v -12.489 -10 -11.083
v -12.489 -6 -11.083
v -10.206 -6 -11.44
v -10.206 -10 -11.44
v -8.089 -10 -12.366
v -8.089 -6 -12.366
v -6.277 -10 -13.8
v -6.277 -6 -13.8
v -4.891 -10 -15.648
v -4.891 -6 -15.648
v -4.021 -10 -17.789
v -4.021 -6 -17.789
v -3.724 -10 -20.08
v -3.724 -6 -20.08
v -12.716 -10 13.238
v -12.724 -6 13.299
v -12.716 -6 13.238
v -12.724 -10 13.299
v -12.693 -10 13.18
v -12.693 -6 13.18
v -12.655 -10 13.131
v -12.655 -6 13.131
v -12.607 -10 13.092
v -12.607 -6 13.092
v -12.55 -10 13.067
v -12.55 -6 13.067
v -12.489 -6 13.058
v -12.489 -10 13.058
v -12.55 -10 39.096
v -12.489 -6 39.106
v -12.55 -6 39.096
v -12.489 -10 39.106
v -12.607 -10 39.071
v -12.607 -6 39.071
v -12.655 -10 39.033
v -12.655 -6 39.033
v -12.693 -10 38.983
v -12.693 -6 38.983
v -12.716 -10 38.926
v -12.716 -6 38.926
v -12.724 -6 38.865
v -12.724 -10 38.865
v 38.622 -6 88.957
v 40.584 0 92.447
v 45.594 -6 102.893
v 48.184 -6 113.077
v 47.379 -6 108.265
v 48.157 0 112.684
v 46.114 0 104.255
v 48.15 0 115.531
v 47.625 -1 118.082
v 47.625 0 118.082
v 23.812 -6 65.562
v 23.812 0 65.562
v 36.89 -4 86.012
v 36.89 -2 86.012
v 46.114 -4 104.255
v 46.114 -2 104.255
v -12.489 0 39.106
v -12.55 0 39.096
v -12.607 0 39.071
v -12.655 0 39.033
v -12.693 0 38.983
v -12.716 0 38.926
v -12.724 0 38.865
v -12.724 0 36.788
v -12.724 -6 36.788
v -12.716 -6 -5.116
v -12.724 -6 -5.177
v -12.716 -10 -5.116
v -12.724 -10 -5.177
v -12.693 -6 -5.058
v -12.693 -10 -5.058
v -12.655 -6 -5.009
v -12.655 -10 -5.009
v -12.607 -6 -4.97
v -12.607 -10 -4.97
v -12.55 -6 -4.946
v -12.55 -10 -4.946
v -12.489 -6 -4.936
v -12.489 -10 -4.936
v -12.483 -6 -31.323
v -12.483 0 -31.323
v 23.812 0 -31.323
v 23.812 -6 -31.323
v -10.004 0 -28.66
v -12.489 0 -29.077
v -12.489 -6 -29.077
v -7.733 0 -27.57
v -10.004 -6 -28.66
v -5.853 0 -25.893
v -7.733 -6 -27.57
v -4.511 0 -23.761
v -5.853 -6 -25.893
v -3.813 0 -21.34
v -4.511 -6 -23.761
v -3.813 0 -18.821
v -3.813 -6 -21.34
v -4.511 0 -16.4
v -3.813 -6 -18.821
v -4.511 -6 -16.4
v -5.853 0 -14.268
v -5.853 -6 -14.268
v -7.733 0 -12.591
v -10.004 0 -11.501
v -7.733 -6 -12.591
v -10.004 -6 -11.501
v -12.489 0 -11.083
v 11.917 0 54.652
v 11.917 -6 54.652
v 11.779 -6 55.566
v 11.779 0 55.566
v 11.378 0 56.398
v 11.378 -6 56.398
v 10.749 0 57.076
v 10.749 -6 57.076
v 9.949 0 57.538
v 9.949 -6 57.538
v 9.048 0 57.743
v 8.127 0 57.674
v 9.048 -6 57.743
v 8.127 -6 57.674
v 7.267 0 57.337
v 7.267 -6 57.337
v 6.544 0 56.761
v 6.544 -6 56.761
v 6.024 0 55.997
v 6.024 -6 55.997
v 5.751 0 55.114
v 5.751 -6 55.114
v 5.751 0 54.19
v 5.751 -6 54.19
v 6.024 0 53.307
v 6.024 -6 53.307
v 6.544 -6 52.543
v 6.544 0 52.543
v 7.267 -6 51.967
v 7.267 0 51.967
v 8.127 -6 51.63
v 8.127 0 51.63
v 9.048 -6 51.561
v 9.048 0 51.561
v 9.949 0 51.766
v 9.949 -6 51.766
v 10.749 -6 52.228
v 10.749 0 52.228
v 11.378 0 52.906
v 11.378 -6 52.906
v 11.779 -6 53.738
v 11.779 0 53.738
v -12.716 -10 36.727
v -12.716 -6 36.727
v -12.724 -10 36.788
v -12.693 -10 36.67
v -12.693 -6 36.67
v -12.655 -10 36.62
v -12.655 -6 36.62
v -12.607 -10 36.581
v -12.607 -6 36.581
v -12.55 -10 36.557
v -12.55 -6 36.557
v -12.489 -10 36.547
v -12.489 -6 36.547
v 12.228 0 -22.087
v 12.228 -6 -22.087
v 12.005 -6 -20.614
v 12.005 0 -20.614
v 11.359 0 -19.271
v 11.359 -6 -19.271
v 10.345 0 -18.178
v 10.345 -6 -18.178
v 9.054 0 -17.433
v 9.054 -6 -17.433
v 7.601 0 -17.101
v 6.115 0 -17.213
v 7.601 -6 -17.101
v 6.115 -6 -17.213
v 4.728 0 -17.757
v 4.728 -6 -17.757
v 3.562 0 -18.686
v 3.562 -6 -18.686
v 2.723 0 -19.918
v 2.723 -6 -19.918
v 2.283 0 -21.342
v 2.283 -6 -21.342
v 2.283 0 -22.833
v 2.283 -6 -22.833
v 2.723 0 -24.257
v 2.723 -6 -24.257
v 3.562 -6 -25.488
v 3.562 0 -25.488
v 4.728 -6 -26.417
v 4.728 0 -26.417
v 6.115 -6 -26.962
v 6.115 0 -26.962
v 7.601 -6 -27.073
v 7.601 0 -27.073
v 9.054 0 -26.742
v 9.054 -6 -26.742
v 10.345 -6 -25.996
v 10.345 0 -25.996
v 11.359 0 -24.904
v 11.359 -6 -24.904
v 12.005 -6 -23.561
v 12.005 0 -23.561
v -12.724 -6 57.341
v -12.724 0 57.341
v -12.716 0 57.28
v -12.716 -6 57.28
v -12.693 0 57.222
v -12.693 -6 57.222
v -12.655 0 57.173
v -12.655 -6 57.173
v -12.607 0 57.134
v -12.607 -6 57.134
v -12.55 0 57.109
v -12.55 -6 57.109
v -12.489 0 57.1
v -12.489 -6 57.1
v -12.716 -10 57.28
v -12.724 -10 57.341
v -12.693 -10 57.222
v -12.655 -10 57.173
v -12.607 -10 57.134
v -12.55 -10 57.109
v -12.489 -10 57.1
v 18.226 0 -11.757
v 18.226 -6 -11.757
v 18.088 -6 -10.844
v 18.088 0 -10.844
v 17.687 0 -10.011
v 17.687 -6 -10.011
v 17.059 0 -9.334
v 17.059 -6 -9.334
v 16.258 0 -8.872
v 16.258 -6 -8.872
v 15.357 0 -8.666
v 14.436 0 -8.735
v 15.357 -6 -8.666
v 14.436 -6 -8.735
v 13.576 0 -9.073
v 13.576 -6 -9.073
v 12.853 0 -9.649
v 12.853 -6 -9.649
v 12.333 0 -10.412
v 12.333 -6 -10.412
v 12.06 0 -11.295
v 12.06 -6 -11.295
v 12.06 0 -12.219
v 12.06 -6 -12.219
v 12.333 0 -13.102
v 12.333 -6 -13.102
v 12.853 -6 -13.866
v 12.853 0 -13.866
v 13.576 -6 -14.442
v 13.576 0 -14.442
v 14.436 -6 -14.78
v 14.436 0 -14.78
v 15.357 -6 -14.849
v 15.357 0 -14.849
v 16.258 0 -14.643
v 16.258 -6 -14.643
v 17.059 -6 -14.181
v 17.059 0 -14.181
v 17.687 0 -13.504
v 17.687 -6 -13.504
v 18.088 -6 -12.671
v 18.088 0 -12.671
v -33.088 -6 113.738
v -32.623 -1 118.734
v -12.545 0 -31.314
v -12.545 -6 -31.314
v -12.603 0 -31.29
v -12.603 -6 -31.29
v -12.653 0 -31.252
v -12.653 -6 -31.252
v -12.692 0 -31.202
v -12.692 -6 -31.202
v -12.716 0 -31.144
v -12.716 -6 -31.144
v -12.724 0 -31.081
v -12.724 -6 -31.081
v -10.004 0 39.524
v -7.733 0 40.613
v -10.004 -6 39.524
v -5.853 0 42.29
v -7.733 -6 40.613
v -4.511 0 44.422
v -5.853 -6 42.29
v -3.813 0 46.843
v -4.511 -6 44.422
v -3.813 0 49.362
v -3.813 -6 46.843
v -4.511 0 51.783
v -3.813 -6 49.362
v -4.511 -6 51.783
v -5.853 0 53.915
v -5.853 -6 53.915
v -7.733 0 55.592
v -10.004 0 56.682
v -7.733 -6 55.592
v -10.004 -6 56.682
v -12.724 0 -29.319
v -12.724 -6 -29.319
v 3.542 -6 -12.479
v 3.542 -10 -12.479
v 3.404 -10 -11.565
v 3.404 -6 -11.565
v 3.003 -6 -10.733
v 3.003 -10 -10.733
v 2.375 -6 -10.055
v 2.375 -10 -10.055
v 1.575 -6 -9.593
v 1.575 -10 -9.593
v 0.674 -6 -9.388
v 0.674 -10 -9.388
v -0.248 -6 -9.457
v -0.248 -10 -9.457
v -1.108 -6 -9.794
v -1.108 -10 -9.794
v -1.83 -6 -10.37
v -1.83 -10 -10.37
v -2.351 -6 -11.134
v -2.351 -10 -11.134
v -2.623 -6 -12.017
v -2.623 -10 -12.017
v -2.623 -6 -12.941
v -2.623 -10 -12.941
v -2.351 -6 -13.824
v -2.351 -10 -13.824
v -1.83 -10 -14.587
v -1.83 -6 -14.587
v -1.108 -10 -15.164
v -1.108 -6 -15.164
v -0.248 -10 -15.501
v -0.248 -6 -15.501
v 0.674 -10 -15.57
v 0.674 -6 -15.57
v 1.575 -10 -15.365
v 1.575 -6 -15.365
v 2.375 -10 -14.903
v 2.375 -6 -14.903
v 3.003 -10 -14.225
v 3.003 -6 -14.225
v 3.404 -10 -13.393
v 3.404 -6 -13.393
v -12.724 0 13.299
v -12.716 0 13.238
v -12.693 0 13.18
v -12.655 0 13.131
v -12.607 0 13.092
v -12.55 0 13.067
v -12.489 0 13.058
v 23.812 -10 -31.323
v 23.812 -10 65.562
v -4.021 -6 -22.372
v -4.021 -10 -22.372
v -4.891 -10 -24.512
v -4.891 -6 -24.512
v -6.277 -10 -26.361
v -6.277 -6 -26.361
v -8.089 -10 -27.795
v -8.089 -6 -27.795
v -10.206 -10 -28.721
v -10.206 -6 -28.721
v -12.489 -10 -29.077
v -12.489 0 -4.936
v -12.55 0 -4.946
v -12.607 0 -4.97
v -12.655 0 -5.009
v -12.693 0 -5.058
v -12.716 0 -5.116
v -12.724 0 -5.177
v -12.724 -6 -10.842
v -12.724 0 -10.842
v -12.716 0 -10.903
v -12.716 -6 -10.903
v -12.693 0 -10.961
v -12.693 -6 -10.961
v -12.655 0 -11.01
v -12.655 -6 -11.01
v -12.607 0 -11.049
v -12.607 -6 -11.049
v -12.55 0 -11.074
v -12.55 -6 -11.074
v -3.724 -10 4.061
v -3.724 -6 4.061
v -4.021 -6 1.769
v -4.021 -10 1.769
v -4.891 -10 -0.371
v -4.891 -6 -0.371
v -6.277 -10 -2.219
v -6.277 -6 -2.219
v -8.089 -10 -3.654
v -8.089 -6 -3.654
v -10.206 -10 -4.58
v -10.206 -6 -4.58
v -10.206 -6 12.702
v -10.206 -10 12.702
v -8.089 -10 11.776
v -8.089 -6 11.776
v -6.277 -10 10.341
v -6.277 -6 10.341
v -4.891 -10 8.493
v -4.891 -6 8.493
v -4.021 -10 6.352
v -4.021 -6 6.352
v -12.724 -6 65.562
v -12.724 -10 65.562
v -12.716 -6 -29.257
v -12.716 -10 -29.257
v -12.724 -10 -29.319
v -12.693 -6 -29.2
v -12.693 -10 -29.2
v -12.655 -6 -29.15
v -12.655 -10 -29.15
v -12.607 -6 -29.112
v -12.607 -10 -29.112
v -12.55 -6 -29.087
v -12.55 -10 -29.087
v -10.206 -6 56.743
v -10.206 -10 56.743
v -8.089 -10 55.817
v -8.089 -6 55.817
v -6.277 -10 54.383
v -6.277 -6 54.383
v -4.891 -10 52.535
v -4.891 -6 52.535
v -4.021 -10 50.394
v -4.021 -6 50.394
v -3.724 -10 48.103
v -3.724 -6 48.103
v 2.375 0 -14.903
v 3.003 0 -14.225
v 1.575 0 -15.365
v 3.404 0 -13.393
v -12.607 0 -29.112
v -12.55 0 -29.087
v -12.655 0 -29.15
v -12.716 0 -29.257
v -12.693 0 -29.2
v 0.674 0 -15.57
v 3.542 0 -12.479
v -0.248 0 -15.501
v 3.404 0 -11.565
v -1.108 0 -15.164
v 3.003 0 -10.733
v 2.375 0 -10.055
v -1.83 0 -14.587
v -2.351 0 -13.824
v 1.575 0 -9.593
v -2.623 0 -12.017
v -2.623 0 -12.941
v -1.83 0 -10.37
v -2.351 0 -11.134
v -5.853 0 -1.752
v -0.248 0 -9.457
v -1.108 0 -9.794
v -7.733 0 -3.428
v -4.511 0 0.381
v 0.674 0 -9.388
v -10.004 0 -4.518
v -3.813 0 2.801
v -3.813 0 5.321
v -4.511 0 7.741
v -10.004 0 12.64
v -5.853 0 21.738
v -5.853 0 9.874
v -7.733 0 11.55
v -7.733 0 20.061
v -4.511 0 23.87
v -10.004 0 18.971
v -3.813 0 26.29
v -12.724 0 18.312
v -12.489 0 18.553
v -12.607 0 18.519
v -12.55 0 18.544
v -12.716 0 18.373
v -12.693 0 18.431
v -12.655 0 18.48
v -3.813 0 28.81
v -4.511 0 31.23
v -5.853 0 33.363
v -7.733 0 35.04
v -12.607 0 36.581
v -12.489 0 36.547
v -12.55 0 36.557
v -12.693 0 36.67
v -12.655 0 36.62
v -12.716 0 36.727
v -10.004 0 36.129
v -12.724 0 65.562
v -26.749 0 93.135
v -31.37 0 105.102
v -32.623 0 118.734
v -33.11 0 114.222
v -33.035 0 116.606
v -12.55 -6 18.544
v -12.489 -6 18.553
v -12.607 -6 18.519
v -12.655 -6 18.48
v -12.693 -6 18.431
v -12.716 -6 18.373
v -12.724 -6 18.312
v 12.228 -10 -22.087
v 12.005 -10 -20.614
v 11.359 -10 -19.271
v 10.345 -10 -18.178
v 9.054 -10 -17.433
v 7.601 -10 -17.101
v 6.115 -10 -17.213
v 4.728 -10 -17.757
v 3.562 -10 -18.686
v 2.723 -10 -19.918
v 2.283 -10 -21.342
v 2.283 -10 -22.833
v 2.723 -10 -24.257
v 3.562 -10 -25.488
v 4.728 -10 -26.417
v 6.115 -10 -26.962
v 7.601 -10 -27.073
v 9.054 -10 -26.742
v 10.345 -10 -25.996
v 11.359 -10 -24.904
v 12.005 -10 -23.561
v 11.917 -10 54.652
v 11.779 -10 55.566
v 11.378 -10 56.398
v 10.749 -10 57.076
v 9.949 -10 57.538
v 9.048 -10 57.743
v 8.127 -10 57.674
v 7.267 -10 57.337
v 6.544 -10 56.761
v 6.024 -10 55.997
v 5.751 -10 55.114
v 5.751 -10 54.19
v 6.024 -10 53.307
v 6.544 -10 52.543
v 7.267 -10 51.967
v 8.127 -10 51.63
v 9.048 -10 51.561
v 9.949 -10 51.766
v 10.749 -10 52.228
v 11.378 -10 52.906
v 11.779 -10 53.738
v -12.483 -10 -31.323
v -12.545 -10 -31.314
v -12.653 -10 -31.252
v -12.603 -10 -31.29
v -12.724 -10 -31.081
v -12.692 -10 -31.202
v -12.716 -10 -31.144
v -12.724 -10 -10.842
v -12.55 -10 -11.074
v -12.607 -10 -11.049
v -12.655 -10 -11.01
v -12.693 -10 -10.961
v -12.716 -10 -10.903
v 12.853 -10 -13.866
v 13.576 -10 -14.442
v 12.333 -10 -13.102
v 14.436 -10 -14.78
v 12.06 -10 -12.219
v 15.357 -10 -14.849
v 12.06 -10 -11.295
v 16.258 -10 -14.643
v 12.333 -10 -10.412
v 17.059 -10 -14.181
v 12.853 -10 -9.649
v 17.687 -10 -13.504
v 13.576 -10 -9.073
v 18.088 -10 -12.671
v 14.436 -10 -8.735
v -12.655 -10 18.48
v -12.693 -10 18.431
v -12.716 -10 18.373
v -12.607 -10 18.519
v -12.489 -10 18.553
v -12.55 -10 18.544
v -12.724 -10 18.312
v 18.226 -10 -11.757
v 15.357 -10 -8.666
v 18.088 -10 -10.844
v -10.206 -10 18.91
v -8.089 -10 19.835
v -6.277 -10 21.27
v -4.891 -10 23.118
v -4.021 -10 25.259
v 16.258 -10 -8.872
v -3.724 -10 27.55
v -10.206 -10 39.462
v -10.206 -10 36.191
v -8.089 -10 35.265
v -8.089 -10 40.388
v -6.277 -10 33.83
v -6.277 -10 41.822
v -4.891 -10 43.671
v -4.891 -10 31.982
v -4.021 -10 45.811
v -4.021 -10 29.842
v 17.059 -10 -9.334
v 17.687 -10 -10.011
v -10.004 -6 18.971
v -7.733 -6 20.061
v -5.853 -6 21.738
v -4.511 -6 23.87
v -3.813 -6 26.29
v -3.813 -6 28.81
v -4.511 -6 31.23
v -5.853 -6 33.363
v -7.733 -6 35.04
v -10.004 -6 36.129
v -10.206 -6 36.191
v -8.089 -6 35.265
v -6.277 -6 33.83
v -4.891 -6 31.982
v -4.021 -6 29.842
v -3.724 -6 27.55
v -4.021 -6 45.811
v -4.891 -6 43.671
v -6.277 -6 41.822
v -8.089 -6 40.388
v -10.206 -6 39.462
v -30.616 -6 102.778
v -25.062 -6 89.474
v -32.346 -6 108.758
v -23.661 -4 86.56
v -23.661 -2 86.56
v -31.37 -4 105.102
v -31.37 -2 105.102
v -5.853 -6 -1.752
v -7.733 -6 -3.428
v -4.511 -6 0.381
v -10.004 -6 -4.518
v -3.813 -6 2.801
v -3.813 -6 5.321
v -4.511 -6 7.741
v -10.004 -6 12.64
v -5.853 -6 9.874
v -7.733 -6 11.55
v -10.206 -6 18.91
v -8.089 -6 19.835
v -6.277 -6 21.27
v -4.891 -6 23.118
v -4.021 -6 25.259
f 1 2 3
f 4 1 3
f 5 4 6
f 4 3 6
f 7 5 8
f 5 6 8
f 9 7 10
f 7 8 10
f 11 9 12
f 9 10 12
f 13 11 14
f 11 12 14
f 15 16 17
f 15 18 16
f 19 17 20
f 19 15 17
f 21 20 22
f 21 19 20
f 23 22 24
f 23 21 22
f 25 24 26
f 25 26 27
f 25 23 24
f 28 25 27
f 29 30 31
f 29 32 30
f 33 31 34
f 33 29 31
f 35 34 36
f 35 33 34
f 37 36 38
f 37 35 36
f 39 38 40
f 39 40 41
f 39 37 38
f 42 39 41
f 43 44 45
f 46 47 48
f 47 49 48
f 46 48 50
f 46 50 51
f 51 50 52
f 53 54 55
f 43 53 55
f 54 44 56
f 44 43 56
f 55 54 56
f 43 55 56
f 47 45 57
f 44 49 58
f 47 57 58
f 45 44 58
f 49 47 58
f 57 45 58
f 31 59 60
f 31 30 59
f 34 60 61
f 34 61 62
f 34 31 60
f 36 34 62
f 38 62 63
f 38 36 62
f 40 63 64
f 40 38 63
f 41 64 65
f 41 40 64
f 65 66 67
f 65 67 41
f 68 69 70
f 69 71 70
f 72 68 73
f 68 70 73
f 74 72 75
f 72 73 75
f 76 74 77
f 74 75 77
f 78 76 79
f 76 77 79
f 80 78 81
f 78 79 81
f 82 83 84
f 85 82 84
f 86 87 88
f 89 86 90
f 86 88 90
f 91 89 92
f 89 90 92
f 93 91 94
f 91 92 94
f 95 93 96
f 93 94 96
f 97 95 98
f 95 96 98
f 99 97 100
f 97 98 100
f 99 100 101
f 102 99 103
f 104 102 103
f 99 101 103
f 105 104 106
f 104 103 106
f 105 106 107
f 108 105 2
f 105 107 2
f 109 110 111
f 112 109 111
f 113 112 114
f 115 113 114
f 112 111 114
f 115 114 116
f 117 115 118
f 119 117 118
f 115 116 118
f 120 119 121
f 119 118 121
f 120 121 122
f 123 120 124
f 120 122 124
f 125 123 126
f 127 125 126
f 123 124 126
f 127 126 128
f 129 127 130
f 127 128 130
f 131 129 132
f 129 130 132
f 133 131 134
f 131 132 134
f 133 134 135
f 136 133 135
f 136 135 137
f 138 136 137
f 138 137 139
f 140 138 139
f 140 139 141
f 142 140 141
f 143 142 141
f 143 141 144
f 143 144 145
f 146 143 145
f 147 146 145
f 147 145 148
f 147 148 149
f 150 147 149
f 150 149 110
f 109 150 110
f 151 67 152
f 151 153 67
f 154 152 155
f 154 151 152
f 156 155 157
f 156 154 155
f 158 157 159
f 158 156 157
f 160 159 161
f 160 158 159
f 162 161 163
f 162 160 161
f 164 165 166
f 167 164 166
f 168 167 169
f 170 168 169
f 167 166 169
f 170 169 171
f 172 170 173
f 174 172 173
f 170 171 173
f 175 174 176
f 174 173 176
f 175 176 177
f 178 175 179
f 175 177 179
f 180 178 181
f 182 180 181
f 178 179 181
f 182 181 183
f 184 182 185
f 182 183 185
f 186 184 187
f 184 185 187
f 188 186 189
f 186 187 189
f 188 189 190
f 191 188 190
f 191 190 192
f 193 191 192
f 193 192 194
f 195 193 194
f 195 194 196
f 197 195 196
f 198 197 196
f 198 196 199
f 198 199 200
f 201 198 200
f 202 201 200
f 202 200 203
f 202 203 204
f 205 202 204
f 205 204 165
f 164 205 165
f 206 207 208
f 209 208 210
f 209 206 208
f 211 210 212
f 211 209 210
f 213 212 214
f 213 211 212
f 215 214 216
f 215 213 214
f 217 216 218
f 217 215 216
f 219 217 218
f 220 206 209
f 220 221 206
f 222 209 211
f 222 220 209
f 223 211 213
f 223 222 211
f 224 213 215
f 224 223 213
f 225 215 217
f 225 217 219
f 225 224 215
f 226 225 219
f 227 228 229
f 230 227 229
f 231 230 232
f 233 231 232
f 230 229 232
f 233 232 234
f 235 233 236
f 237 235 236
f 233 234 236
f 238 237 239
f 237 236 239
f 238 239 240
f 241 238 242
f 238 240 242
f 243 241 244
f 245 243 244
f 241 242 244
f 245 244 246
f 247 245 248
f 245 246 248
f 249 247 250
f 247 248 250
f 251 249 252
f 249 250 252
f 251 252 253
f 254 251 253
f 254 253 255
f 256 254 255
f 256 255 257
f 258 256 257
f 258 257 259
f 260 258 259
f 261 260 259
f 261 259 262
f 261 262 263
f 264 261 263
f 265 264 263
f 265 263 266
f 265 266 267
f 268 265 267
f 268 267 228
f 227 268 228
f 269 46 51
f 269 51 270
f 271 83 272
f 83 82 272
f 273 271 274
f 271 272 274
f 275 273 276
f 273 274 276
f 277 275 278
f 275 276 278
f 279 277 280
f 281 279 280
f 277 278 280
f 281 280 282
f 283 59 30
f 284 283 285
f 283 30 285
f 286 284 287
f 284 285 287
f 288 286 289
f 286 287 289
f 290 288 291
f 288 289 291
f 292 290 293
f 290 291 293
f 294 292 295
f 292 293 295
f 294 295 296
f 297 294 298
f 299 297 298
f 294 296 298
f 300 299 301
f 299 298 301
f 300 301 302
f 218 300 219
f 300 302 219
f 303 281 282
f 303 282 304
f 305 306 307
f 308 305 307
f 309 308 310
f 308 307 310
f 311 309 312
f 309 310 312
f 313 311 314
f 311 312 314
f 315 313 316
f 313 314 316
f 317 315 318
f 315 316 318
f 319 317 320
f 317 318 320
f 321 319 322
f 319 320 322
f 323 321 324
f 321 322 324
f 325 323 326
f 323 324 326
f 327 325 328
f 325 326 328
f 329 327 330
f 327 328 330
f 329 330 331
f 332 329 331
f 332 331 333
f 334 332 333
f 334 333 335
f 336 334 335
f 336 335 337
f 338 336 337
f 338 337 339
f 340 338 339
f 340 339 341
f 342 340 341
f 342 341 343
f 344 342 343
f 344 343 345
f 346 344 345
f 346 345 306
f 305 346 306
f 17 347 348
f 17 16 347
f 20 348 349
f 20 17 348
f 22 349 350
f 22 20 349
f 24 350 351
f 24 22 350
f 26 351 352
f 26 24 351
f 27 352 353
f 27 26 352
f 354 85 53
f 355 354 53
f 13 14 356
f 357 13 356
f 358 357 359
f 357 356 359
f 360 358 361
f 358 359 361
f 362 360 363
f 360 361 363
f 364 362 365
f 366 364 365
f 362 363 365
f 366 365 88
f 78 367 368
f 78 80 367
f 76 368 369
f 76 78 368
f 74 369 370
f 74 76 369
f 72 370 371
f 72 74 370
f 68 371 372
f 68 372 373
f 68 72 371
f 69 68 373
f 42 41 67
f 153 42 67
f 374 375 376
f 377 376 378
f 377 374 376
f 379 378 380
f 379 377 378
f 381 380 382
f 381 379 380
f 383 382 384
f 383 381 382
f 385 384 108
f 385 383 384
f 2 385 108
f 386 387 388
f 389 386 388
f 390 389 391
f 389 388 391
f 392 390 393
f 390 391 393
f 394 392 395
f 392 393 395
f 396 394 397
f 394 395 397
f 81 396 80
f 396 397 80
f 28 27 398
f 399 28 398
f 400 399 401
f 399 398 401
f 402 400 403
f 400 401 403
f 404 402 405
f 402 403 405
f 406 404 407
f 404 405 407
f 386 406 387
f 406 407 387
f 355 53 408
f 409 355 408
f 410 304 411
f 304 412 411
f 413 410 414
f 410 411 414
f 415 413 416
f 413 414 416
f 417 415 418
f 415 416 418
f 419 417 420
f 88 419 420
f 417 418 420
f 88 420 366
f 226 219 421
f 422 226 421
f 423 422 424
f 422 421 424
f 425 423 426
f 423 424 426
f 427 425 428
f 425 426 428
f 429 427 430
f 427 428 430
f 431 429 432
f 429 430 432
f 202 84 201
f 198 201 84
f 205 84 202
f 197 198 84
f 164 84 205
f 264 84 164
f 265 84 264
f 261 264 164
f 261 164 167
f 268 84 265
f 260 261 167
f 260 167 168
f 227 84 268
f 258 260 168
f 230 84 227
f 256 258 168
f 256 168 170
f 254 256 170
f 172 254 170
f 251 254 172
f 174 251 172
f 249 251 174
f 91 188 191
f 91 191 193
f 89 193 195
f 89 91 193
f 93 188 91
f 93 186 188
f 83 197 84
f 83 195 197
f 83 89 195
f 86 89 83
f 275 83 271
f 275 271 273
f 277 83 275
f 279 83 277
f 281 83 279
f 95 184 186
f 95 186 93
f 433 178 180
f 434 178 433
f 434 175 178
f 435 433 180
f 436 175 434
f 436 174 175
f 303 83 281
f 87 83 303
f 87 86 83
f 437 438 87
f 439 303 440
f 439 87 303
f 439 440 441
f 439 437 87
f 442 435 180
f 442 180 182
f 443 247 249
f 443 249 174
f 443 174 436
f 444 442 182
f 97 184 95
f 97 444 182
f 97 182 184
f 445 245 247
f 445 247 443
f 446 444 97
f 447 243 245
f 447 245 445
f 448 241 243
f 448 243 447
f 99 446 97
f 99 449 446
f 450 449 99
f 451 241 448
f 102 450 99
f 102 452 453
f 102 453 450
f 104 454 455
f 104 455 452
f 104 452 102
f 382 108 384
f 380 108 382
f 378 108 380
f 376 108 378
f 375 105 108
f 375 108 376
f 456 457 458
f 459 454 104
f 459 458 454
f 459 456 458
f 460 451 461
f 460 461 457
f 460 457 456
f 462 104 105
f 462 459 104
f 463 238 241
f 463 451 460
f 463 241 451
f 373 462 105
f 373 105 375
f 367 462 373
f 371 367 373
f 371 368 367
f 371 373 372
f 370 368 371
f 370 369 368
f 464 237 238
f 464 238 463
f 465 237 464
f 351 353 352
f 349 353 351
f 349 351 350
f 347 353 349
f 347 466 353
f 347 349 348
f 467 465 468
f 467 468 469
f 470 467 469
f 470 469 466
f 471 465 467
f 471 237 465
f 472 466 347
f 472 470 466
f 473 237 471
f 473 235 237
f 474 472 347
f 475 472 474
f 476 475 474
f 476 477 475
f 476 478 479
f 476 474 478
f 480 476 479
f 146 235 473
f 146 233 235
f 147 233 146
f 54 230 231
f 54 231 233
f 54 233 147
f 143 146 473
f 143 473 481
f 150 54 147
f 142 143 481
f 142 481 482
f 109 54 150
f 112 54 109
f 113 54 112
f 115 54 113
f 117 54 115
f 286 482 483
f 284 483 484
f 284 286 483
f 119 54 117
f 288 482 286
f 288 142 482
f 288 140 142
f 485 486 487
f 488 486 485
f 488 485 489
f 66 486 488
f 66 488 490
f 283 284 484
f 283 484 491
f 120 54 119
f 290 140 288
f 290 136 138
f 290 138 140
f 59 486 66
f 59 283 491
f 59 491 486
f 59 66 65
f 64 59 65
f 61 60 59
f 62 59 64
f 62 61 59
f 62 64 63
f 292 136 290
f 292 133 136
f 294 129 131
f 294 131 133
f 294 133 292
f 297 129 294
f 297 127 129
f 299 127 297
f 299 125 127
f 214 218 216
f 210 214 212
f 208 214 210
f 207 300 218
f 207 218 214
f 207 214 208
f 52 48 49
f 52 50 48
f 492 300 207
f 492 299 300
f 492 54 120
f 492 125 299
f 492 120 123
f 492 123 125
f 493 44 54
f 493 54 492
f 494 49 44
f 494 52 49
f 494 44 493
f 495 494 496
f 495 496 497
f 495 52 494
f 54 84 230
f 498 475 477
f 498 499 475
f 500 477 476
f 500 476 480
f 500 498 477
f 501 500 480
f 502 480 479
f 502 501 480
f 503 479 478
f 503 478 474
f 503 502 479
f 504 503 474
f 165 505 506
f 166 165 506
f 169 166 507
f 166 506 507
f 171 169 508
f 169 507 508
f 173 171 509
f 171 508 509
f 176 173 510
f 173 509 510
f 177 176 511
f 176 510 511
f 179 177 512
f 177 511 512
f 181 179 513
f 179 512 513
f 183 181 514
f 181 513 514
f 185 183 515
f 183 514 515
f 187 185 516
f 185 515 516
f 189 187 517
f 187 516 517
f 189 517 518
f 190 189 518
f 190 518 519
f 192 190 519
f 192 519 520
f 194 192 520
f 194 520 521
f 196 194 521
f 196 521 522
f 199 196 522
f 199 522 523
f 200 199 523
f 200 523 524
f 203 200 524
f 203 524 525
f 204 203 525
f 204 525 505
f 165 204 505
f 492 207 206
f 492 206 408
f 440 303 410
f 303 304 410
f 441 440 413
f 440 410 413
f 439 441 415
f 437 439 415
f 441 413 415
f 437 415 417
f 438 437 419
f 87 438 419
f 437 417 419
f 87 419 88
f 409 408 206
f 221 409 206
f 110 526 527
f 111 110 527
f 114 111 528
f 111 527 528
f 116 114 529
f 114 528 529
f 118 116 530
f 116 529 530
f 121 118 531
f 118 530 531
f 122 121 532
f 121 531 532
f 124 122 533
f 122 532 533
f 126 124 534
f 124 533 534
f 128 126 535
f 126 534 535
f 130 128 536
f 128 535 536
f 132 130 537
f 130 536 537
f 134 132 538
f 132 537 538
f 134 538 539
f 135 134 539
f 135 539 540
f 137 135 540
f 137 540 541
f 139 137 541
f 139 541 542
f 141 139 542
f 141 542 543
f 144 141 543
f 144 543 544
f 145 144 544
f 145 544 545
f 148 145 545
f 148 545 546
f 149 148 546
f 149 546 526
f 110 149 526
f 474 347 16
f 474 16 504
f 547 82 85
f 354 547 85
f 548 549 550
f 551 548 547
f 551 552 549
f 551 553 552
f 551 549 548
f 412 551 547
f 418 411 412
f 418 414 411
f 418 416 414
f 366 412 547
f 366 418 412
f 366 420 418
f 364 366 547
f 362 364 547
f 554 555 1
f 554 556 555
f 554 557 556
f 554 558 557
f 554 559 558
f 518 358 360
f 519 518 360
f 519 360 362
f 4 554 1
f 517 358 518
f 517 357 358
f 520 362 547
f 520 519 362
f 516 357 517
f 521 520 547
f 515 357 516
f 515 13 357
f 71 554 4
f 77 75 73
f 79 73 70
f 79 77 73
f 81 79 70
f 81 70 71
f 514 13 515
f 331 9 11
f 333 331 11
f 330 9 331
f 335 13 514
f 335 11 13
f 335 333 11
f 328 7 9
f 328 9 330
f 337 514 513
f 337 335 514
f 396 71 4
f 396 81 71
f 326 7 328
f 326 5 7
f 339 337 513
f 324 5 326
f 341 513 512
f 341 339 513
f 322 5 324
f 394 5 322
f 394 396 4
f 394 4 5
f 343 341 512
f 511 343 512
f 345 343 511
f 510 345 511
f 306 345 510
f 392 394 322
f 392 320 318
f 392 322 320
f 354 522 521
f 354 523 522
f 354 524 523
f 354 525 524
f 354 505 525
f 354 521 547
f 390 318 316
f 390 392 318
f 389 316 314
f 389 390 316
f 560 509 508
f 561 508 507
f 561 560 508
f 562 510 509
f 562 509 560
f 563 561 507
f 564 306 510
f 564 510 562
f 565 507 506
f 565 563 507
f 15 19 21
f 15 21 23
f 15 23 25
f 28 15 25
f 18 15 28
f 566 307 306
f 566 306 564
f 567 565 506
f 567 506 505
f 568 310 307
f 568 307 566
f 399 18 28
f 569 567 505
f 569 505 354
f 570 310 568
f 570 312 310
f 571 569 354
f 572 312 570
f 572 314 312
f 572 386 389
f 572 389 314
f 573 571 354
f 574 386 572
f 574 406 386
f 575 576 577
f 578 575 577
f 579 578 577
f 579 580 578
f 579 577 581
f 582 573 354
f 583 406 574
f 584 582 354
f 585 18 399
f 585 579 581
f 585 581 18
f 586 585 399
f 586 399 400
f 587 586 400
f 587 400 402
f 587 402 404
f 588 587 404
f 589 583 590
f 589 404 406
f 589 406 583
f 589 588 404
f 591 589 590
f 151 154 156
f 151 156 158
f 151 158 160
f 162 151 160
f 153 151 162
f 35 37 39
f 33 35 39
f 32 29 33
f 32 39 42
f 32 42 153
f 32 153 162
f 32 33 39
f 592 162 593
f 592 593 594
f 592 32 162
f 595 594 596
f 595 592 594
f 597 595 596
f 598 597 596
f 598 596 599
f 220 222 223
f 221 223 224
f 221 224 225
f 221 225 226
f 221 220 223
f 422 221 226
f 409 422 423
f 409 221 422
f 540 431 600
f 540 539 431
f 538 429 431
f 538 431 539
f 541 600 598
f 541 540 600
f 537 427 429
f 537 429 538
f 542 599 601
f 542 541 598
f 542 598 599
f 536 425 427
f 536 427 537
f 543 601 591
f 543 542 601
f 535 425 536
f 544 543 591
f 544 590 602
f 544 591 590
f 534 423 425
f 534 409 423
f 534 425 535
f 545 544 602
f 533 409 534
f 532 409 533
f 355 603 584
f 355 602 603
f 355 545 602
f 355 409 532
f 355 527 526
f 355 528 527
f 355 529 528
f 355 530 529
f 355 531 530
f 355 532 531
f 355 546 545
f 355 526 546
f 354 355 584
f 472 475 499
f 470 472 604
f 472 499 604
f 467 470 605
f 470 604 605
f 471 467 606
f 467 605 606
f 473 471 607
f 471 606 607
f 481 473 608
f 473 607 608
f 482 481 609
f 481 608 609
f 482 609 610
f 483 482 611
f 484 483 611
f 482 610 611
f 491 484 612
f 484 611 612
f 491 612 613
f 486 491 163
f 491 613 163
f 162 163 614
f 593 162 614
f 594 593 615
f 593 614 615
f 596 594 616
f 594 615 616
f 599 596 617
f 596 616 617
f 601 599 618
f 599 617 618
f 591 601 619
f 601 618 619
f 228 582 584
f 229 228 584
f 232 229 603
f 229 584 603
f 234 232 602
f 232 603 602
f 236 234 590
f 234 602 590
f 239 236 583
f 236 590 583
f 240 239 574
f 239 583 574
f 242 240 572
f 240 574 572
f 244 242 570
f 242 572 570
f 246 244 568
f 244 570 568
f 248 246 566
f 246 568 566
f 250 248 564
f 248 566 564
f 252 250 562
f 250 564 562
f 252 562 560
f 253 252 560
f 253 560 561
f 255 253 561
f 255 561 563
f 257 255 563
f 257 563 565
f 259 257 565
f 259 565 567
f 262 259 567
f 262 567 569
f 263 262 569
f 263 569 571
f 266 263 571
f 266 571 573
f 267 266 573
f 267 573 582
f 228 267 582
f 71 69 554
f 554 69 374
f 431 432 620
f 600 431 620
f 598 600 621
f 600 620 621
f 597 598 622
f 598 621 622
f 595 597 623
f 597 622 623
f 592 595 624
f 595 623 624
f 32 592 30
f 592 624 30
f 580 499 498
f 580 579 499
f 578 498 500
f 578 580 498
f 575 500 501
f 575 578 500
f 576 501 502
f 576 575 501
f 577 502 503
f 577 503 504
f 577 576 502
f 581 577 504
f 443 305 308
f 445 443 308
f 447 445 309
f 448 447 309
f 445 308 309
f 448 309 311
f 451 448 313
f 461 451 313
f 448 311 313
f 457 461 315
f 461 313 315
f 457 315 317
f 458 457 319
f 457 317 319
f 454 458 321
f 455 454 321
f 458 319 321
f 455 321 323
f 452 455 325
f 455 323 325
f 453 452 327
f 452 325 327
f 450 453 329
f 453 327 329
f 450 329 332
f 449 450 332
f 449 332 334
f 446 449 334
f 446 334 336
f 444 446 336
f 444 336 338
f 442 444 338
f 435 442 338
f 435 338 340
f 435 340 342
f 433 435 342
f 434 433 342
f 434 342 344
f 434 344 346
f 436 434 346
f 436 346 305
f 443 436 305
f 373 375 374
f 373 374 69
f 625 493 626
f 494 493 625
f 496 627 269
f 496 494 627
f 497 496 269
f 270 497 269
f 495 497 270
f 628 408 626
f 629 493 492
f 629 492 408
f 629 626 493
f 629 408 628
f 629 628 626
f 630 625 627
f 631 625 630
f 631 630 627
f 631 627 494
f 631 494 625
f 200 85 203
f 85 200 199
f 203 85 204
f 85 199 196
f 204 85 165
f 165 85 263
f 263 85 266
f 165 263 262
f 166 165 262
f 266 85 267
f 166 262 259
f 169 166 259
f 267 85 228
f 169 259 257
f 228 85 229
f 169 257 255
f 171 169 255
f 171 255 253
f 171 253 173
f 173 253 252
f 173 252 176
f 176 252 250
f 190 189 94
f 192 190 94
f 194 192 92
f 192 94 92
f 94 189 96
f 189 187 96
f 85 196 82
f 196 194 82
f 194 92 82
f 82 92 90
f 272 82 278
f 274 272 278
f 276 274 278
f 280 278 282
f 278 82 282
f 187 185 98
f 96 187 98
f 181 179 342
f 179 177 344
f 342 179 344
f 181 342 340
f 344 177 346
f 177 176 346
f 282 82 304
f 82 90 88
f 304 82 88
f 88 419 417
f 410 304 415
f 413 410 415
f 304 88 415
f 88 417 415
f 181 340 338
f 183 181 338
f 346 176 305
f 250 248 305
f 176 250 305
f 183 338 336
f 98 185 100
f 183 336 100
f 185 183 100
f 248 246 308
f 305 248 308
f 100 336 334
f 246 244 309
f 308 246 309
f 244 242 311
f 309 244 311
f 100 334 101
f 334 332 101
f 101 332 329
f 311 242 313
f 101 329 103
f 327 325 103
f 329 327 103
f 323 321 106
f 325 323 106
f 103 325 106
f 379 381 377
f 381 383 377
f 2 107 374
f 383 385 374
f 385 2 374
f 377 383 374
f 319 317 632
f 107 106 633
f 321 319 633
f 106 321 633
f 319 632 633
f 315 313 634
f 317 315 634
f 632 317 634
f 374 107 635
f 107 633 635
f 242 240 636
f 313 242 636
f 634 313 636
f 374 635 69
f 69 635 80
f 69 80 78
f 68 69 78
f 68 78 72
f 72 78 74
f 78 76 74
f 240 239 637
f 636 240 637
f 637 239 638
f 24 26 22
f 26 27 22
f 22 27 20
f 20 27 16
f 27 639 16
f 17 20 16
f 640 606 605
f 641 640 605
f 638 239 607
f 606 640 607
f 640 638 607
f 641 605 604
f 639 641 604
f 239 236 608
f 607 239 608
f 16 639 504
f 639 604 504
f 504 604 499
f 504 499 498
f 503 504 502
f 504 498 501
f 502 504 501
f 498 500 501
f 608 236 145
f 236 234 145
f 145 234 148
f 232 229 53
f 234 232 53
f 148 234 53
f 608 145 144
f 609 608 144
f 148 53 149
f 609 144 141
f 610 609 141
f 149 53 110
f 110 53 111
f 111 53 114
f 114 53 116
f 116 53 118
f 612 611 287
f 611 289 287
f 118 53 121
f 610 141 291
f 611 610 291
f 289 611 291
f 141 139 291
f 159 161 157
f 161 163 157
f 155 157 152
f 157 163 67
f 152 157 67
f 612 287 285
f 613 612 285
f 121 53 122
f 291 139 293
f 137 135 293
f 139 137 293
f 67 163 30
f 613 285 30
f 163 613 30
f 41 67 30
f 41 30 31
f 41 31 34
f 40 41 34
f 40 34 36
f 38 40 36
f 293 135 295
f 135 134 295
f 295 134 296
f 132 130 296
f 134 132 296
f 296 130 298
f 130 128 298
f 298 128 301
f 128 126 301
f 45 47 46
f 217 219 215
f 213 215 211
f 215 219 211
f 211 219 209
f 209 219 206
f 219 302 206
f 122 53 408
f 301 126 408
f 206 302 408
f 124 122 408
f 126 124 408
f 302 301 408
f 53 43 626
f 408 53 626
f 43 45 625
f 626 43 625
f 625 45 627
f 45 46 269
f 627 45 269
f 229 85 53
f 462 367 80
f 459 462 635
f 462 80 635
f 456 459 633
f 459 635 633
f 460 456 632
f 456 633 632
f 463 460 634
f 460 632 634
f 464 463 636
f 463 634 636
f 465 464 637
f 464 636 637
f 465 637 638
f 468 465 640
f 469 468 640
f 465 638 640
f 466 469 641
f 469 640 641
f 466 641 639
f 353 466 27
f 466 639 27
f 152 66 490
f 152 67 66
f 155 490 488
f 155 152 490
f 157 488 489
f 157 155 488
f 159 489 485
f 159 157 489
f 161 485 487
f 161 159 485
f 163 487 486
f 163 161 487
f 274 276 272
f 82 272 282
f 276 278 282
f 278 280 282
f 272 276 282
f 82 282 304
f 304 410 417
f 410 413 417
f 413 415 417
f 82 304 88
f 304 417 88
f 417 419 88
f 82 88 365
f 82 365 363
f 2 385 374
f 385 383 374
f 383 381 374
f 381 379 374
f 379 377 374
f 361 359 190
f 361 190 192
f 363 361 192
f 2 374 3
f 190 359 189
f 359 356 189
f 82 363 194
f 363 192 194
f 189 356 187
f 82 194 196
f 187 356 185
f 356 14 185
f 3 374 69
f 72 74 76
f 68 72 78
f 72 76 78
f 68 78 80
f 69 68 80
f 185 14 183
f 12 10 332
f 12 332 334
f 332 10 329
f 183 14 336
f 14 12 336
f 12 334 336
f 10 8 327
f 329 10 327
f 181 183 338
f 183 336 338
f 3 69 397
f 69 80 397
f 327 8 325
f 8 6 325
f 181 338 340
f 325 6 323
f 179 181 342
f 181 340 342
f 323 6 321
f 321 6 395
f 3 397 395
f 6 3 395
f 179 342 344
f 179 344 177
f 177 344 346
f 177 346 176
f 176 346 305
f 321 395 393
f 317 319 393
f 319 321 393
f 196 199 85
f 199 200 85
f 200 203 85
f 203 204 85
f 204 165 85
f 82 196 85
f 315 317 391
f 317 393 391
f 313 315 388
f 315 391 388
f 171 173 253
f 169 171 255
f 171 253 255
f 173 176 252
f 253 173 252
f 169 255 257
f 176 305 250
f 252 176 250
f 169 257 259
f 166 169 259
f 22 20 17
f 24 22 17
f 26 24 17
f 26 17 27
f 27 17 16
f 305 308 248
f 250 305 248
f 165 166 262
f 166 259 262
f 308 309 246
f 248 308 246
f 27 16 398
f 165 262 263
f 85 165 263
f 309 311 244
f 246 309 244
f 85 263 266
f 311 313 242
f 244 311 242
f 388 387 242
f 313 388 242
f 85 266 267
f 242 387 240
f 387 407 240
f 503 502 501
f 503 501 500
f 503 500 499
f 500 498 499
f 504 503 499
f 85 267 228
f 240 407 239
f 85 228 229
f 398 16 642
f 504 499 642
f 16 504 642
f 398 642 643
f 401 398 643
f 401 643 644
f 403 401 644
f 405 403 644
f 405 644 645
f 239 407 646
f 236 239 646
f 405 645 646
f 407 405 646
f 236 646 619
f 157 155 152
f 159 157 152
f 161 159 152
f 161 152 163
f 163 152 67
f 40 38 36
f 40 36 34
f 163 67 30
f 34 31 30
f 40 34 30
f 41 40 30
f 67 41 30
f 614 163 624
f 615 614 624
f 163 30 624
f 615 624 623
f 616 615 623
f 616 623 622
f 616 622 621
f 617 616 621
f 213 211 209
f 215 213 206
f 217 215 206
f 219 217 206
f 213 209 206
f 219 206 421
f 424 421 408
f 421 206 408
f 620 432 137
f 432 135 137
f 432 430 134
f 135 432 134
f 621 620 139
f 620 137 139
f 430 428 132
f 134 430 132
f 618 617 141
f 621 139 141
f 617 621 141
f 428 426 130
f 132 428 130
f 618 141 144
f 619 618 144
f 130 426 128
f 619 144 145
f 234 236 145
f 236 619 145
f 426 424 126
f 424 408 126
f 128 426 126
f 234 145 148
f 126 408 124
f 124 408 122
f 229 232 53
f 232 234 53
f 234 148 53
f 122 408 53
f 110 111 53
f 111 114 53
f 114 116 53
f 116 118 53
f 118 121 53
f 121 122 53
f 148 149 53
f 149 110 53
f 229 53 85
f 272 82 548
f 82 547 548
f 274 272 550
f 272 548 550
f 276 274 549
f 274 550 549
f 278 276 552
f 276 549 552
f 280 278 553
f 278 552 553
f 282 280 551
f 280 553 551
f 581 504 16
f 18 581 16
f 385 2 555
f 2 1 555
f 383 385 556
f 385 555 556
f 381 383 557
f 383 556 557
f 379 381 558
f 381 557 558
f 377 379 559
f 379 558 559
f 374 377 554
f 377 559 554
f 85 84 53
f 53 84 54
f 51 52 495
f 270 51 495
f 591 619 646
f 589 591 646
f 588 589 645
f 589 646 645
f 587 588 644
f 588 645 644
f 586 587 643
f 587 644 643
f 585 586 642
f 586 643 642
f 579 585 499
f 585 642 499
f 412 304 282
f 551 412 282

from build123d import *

# Parameters (mm, degrees)
F1_W     = 36.5355033427
F1_H     = 96.8843176961
F2_DEPTH = 6
F4_DEPTH = 4
F3_R     = 9
F5_DEPTH = 25
F6_R     = 3.1
F6_R_2   = 5
F7_DEPTH = 35.6
F8_SIZE  = 5
F9_R     = 0.2414213562
F9_2_R   = 0.2414213562


with BuildPart() as f2:
    # F1 (on face) → F2 (new body)
    with BuildSketch(Plane.XZ):
        with BuildLine():
            add(Edge.make_bspline(
                [(-12.7239916474, 65.5617713928), (-24.1989352738, 86.9689300154), (-35.6738789003, 108.376088638), (-32.6227918267, 118.7339797616)],
                knots=[0, 0, 0, 0, 0.6431047919, 0.6431047919, 0.6431047919, 0.6431047919], degree=3))
            Line((-12.7239916474, 65.5617713928), (23.8115116954, 65.5617713928))
            add(Edge.make_bspline(
                [(23.8115116954, 65.5617713928), (37.5330867792, 86.3799975236), (51.254661863, 107.1982236544), (47.6248264313, 118.0815622211)],
                knots=[0, 0, 0, 0, 0.5930470387, 0.5930470387, 0.5930470387, 0.5930470387], degree=3))
            Line((47.6248264313, 118.0815622211), (-32.6227918267, 118.7339797616))
        make_face()
        with Locations((5.543760024, 17.1196125448)):
            Rectangle(F1_W, F1_H)
    extrude(amount=F2_DEPTH)

    # F3 (on face) → F5 (cut)
    with BuildSketch(Plane.XZ.offset(6)):
        with Locations((-12.7239916474, 48.1027774513)):
            Circle(F3_R)
        with Locations((-12.7239916474, 27.5501671713)):
            Circle(F3_R)
        with Locations((-12.7239916474, 4.060971085)):
            Circle(F3_R)
        with Locations((-12.7239916474, -20.0802776963)):
            Circle(F3_R)
    extrude(amount=-F5_DEPTH, mode=Mode.SUBTRACT)


with BuildPart() as f4:
    # F3 (on face) → F4 (new body)
    with BuildSketch(Plane.XZ.offset(6)):
        with BuildLine():
            Line((23.8115116954, 65.5617713928), (-12.7239916474, 65.5617713928))
            Line((-12.7239916474, 65.5617713928), (-12.7239916474, 57.1027774513))
            ThreePointArc((-12.7239916474, 57.1027774513), (-6.3600306167, 54.466738482), (-3.7239916474, 48.1027774513))
            ThreePointArc((-3.7239916474, 48.1027774513), (-6.3600306167, 41.7388164206), (-12.7239916474, 39.1027774513))
            Line((-12.7239916474, 39.1027774513), (-12.7239916474, 36.5501671713))
            ThreePointArc((-12.7239916474, 36.5501671713), (-6.3600306167, 33.914128202), (-3.7239916474, 27.5501671713))
            ThreePointArc((-3.7239916474, 27.5501671713), (-6.3600306167, 21.1862061406), (-12.7239916474, 18.5501671713))
            Line((-12.7239916474, 18.5501671713), (-12.7239916474, 13.060971085))
            ThreePointArc((-12.7239916474, 13.060971085), (-6.3600306167, 10.4249321157), (-3.7239916474, 4.060971085))
            ThreePointArc((-3.7239916474, 4.060971085), (-6.3600306167, -2.3029899457), (-12.7239916474, -4.939028915))
            Line((-12.7239916474, -4.939028915), (-12.7239916474, -11.0802776963))
            ThreePointArc((-12.7239916474, -11.0802776963), (-6.3600306167, -13.7163166656), (-3.7239916474, -20.0802776963))
            ThreePointArc((-3.7239916474, -20.0802776963), (-6.3600306167, -26.4442387269), (-12.7239916474, -29.0802776963))
            Line((-12.7239916474, -29.0802776963), (-12.7239916474, -31.3225463033))
            Line((-12.7239916474, -31.3225463033), (23.8115116954, -31.3225463033))
            Line((23.8115116954, -31.3225463033), (23.8115116954, 65.5617713928))
        make_face()
    extrude(amount=F4_DEPTH)


with BuildPart() as f7_tool:
    # F6 (on face) → F7 (new body)
    with BuildSketch(Plane.XZ.offset(10)):
        with Locations((0.442061777, -12.4788656831)):
            Circle(F6_R)
        with Locations((15.1257580146, -11.757383123)):
            Circle(F6_R)
        with Locations((8.8166017085, 54.6519830823)):
            Circle(F6_R)
        with Locations((7.2275600396, -22.087328136)):
            Circle(F6_R_2)
    extrude(amount=-F7_DEPTH)


with BuildPart() as f2_1:
    add(f2.part)

    # F7: cut by f7_tool
    add(f7_tool.part, mode=Mode.SUBTRACT)

    # F8
    f8_edges = [f2_1.edges().sort_by_distance(p)[0] for p in [
        (7.501017, -6, 118.407771),
    ]]
    chamfer(f8_edges, length=F8_SIZE)

    # F9
    f9_edges = [f2_1.edges().sort_by_distance(p)[0] for p in [
        (-12.723992, -3, 57.102777),
        (-12.723992, -3, 39.102777),
        (-12.723992, -3, 36.550167),
        (-12.723992, -3, 18.550167),
        (-12.723992, -3, 13.060971),
        (-12.723992, -3, -4.939029),
        (-12.723992, -3, -11.080278),
        (-12.723992, -3, -29.080278),
        (-12.723992, -3, -31.322546),
    ]]
    fillet(f9_edges, radius=F9_R)


with BuildPart() as f4_1:
    add(f4.part)

    # F7: cut by f7_tool
    add(f7_tool.part, mode=Mode.SUBTRACT)

    # F9#2
    f9_2_edges = [f4_1.edges().sort_by_distance(p)[0] for p in [
        (-12.723992, -8, 39.102777),
        (-12.723992, -8, 18.550167),
        (-12.723992, -8, 57.102777),
        (-12.723992, -8, 36.550167),
        (-12.723992, -8, 13.060971),
        (-12.723992, -8, -4.939029),
        (-12.723992, -8, -29.080278),
        (-12.723992, -8, -31.322546),
        (-12.723992, -8, -11.080278),
    ]]
    fillet(f9_2_edges, radius=F9_2_R)


solid = Compound([f2_1.part, f4_1.part])
